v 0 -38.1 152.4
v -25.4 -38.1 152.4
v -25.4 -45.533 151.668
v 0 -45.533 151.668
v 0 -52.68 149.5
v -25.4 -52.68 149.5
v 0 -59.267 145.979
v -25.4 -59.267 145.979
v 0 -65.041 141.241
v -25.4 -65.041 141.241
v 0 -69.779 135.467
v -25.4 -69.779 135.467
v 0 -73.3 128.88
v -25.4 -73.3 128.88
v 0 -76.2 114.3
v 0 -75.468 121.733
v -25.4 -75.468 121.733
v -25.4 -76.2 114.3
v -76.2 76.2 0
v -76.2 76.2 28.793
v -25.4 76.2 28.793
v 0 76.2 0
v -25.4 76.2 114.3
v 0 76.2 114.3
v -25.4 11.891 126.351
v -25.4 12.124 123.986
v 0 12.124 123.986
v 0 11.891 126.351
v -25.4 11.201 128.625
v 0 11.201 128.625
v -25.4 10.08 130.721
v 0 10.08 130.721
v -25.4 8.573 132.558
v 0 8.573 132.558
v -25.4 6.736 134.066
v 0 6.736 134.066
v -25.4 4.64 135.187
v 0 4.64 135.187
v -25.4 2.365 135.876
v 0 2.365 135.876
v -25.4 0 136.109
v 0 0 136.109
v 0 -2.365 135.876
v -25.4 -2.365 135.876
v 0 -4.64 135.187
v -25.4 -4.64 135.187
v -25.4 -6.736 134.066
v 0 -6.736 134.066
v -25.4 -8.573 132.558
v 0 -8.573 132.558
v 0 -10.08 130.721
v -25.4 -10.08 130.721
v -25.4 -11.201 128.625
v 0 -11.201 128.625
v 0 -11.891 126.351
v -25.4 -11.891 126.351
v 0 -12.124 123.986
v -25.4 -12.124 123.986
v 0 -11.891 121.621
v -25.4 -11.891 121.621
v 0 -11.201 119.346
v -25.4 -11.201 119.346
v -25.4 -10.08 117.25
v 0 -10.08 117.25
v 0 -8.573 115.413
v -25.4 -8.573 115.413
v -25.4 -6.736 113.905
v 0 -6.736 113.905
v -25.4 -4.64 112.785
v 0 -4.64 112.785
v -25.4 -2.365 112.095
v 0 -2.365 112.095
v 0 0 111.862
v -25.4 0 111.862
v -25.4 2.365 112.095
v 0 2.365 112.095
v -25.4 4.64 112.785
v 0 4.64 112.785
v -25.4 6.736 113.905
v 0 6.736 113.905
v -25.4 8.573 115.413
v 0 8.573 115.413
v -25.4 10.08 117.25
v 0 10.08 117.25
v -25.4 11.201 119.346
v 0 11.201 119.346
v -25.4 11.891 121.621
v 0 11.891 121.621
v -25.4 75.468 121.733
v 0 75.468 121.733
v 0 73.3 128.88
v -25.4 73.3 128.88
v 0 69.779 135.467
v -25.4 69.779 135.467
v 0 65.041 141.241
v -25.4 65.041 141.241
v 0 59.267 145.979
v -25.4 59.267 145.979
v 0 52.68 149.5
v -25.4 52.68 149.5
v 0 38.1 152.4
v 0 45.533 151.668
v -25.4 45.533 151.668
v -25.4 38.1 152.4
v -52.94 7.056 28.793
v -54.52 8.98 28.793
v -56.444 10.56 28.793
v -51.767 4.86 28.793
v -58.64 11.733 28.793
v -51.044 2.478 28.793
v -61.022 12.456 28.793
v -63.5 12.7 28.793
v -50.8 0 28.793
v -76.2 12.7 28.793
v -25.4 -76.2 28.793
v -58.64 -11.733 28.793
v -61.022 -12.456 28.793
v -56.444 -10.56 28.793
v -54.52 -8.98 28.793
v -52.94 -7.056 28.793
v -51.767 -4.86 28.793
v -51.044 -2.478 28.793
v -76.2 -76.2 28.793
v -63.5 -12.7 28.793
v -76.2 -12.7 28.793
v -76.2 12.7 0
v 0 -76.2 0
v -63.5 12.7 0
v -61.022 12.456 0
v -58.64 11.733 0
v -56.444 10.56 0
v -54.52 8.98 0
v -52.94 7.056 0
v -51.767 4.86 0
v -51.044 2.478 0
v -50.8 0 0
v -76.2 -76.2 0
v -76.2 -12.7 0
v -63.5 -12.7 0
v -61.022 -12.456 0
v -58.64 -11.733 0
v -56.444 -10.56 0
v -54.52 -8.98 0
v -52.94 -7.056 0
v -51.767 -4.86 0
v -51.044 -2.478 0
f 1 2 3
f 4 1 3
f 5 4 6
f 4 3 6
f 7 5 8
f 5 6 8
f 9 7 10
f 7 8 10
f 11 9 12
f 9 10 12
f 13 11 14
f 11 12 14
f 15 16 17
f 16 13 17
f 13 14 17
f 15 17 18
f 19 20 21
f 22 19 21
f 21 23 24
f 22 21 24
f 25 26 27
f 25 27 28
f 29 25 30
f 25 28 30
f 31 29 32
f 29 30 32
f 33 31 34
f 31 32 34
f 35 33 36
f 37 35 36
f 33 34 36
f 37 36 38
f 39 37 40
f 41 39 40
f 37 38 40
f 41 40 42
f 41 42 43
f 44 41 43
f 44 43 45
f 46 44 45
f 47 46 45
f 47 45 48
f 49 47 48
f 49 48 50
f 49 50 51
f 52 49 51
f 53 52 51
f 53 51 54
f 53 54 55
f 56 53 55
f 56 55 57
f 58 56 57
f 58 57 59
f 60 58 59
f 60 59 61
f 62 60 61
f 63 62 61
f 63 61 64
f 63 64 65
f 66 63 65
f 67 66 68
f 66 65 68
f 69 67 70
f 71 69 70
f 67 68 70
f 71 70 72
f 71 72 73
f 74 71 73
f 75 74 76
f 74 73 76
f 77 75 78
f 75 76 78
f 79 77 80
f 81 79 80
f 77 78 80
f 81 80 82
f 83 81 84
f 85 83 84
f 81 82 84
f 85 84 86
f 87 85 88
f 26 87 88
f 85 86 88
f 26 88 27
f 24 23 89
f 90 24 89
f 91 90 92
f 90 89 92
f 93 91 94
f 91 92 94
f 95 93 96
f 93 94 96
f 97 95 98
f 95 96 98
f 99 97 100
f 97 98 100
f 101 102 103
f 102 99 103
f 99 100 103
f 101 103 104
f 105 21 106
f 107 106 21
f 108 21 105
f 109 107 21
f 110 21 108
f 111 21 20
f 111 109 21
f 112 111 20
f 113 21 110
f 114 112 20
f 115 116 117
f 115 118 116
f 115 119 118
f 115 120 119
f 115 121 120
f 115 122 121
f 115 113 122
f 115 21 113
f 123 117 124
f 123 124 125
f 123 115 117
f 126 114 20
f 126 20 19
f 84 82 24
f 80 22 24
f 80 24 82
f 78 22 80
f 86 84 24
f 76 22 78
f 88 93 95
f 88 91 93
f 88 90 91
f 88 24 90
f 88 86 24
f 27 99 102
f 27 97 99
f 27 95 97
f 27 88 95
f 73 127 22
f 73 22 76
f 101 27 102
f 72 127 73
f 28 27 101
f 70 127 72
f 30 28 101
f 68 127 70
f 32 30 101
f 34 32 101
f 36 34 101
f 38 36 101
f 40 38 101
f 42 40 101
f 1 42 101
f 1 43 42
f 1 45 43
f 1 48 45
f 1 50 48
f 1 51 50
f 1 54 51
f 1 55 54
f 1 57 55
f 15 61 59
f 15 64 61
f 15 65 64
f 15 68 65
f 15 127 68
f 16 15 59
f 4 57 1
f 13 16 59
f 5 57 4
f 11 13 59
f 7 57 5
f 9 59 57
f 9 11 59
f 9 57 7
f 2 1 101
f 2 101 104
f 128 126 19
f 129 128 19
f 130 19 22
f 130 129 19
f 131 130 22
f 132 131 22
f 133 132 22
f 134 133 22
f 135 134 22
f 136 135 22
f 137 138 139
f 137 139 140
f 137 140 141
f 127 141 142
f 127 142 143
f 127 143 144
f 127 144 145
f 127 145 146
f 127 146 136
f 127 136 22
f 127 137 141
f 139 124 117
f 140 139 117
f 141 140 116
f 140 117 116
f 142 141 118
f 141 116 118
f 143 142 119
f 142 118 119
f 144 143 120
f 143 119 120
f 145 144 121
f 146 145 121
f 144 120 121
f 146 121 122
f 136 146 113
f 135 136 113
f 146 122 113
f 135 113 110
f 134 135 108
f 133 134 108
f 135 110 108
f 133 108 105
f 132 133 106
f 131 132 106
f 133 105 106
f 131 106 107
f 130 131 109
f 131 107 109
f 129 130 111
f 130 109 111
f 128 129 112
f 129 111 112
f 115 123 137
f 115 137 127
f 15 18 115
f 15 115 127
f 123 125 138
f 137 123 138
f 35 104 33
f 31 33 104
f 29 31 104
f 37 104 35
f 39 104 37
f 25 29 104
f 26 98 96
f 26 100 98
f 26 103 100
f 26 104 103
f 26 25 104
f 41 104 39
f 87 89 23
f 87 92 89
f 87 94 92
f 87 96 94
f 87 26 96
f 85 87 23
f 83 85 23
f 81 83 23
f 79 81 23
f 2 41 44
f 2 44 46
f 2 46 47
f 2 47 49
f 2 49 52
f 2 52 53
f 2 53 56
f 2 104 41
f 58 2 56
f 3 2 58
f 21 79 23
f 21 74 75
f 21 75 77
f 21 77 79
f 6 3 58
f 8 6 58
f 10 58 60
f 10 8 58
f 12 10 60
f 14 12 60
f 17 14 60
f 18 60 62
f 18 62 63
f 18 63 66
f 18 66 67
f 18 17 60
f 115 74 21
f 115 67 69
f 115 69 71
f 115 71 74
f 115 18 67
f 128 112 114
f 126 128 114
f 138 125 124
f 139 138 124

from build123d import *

# Parameters (mm, degrees)
F1_DEPTH  = 76.2
F1_FACE_W = 152.4
F1_FACE_H = 152.4
F2_DEPTH  = 25.4
F3_R      = 12.123607
F4_DEPTH  = 76.201
F6_DEPTH  = 28.794128
F8_DEPTH  = 25.401


with BuildPart() as f1:
    # F0 (on Front) → F1 (new body, symmetric)
    with BuildSketch(Plane.XZ):
        Polygon((-76.2, 0), (0, 0), (0, 152.4), (-25.4, 152.4), (-25.4, 28.793128), (-76.2, 28.793128), align=None)
    extrude(amount=F1_DEPTH, both=True)

    # F1_face (on face) → F2 (cut)
    with BuildSketch(Plane(origin=(0, 0, 76.2), x_dir=(0, 1, 0), z_dir=(1, 0, 0))):
        Rectangle(F1_FACE_W, F1_FACE_H)
    extrude(amount=F2_DEPTH, mode=Mode.SUBTRACT)

    # F3 (on face) → F4 (cut, through all)
    with BuildSketch(Plane.YZ):
        with Locations((0, 123.985767)):
            Circle(F3_R)
    extrude(amount=-F4_DEPTH, mode=Mode.SUBTRACT)

    # F5 (on face) → F6 (cut, through all)
    with BuildSketch(Plane.XY.offset(28.793128)):
        with BuildLine():
            Line((-63.5, 12.7), (-76.2, 12.7))
            Line((-76.2, 12.7), (-76.2, -12.7))
            Line((-76.2, -12.7), (-63.5, -12.7))
            ThreePointArc((-63.5, -12.7), (-50.8, 0), (-63.5, 12.7))
        make_face()
    extrude(amount=-F6_DEPTH, mode=Mode.SUBTRACT)

    # F7 (on face) → F8 (cut, through all)
    with BuildSketch(Plane(origin=(-25.4, 0, 0), x_dir=(0, -1, 0), z_dir=(-1, 0, 0))):
        with BuildLine():
            ThreePointArc((38.1, 152.4), (65.040768, 141.240768), (76.2, 114.3))
            Line((76.2, 114.3), (76.2, 152.4))
            Line((76.2, 152.4), (38.1, 152.4))
        make_face()
        with BuildLine():
            ThreePointArc((-76.2, 114.3), (-65.040768, 141.240768), (-38.1, 152.4))
            Line((-38.1, 152.4), (-76.2, 152.4))
            Line((-76.2, 152.4), (-76.2, 114.3))
        make_face()
    extrude(amount=-F8_DEPTH, mode=Mode.SUBTRACT)


solid = f1.part
